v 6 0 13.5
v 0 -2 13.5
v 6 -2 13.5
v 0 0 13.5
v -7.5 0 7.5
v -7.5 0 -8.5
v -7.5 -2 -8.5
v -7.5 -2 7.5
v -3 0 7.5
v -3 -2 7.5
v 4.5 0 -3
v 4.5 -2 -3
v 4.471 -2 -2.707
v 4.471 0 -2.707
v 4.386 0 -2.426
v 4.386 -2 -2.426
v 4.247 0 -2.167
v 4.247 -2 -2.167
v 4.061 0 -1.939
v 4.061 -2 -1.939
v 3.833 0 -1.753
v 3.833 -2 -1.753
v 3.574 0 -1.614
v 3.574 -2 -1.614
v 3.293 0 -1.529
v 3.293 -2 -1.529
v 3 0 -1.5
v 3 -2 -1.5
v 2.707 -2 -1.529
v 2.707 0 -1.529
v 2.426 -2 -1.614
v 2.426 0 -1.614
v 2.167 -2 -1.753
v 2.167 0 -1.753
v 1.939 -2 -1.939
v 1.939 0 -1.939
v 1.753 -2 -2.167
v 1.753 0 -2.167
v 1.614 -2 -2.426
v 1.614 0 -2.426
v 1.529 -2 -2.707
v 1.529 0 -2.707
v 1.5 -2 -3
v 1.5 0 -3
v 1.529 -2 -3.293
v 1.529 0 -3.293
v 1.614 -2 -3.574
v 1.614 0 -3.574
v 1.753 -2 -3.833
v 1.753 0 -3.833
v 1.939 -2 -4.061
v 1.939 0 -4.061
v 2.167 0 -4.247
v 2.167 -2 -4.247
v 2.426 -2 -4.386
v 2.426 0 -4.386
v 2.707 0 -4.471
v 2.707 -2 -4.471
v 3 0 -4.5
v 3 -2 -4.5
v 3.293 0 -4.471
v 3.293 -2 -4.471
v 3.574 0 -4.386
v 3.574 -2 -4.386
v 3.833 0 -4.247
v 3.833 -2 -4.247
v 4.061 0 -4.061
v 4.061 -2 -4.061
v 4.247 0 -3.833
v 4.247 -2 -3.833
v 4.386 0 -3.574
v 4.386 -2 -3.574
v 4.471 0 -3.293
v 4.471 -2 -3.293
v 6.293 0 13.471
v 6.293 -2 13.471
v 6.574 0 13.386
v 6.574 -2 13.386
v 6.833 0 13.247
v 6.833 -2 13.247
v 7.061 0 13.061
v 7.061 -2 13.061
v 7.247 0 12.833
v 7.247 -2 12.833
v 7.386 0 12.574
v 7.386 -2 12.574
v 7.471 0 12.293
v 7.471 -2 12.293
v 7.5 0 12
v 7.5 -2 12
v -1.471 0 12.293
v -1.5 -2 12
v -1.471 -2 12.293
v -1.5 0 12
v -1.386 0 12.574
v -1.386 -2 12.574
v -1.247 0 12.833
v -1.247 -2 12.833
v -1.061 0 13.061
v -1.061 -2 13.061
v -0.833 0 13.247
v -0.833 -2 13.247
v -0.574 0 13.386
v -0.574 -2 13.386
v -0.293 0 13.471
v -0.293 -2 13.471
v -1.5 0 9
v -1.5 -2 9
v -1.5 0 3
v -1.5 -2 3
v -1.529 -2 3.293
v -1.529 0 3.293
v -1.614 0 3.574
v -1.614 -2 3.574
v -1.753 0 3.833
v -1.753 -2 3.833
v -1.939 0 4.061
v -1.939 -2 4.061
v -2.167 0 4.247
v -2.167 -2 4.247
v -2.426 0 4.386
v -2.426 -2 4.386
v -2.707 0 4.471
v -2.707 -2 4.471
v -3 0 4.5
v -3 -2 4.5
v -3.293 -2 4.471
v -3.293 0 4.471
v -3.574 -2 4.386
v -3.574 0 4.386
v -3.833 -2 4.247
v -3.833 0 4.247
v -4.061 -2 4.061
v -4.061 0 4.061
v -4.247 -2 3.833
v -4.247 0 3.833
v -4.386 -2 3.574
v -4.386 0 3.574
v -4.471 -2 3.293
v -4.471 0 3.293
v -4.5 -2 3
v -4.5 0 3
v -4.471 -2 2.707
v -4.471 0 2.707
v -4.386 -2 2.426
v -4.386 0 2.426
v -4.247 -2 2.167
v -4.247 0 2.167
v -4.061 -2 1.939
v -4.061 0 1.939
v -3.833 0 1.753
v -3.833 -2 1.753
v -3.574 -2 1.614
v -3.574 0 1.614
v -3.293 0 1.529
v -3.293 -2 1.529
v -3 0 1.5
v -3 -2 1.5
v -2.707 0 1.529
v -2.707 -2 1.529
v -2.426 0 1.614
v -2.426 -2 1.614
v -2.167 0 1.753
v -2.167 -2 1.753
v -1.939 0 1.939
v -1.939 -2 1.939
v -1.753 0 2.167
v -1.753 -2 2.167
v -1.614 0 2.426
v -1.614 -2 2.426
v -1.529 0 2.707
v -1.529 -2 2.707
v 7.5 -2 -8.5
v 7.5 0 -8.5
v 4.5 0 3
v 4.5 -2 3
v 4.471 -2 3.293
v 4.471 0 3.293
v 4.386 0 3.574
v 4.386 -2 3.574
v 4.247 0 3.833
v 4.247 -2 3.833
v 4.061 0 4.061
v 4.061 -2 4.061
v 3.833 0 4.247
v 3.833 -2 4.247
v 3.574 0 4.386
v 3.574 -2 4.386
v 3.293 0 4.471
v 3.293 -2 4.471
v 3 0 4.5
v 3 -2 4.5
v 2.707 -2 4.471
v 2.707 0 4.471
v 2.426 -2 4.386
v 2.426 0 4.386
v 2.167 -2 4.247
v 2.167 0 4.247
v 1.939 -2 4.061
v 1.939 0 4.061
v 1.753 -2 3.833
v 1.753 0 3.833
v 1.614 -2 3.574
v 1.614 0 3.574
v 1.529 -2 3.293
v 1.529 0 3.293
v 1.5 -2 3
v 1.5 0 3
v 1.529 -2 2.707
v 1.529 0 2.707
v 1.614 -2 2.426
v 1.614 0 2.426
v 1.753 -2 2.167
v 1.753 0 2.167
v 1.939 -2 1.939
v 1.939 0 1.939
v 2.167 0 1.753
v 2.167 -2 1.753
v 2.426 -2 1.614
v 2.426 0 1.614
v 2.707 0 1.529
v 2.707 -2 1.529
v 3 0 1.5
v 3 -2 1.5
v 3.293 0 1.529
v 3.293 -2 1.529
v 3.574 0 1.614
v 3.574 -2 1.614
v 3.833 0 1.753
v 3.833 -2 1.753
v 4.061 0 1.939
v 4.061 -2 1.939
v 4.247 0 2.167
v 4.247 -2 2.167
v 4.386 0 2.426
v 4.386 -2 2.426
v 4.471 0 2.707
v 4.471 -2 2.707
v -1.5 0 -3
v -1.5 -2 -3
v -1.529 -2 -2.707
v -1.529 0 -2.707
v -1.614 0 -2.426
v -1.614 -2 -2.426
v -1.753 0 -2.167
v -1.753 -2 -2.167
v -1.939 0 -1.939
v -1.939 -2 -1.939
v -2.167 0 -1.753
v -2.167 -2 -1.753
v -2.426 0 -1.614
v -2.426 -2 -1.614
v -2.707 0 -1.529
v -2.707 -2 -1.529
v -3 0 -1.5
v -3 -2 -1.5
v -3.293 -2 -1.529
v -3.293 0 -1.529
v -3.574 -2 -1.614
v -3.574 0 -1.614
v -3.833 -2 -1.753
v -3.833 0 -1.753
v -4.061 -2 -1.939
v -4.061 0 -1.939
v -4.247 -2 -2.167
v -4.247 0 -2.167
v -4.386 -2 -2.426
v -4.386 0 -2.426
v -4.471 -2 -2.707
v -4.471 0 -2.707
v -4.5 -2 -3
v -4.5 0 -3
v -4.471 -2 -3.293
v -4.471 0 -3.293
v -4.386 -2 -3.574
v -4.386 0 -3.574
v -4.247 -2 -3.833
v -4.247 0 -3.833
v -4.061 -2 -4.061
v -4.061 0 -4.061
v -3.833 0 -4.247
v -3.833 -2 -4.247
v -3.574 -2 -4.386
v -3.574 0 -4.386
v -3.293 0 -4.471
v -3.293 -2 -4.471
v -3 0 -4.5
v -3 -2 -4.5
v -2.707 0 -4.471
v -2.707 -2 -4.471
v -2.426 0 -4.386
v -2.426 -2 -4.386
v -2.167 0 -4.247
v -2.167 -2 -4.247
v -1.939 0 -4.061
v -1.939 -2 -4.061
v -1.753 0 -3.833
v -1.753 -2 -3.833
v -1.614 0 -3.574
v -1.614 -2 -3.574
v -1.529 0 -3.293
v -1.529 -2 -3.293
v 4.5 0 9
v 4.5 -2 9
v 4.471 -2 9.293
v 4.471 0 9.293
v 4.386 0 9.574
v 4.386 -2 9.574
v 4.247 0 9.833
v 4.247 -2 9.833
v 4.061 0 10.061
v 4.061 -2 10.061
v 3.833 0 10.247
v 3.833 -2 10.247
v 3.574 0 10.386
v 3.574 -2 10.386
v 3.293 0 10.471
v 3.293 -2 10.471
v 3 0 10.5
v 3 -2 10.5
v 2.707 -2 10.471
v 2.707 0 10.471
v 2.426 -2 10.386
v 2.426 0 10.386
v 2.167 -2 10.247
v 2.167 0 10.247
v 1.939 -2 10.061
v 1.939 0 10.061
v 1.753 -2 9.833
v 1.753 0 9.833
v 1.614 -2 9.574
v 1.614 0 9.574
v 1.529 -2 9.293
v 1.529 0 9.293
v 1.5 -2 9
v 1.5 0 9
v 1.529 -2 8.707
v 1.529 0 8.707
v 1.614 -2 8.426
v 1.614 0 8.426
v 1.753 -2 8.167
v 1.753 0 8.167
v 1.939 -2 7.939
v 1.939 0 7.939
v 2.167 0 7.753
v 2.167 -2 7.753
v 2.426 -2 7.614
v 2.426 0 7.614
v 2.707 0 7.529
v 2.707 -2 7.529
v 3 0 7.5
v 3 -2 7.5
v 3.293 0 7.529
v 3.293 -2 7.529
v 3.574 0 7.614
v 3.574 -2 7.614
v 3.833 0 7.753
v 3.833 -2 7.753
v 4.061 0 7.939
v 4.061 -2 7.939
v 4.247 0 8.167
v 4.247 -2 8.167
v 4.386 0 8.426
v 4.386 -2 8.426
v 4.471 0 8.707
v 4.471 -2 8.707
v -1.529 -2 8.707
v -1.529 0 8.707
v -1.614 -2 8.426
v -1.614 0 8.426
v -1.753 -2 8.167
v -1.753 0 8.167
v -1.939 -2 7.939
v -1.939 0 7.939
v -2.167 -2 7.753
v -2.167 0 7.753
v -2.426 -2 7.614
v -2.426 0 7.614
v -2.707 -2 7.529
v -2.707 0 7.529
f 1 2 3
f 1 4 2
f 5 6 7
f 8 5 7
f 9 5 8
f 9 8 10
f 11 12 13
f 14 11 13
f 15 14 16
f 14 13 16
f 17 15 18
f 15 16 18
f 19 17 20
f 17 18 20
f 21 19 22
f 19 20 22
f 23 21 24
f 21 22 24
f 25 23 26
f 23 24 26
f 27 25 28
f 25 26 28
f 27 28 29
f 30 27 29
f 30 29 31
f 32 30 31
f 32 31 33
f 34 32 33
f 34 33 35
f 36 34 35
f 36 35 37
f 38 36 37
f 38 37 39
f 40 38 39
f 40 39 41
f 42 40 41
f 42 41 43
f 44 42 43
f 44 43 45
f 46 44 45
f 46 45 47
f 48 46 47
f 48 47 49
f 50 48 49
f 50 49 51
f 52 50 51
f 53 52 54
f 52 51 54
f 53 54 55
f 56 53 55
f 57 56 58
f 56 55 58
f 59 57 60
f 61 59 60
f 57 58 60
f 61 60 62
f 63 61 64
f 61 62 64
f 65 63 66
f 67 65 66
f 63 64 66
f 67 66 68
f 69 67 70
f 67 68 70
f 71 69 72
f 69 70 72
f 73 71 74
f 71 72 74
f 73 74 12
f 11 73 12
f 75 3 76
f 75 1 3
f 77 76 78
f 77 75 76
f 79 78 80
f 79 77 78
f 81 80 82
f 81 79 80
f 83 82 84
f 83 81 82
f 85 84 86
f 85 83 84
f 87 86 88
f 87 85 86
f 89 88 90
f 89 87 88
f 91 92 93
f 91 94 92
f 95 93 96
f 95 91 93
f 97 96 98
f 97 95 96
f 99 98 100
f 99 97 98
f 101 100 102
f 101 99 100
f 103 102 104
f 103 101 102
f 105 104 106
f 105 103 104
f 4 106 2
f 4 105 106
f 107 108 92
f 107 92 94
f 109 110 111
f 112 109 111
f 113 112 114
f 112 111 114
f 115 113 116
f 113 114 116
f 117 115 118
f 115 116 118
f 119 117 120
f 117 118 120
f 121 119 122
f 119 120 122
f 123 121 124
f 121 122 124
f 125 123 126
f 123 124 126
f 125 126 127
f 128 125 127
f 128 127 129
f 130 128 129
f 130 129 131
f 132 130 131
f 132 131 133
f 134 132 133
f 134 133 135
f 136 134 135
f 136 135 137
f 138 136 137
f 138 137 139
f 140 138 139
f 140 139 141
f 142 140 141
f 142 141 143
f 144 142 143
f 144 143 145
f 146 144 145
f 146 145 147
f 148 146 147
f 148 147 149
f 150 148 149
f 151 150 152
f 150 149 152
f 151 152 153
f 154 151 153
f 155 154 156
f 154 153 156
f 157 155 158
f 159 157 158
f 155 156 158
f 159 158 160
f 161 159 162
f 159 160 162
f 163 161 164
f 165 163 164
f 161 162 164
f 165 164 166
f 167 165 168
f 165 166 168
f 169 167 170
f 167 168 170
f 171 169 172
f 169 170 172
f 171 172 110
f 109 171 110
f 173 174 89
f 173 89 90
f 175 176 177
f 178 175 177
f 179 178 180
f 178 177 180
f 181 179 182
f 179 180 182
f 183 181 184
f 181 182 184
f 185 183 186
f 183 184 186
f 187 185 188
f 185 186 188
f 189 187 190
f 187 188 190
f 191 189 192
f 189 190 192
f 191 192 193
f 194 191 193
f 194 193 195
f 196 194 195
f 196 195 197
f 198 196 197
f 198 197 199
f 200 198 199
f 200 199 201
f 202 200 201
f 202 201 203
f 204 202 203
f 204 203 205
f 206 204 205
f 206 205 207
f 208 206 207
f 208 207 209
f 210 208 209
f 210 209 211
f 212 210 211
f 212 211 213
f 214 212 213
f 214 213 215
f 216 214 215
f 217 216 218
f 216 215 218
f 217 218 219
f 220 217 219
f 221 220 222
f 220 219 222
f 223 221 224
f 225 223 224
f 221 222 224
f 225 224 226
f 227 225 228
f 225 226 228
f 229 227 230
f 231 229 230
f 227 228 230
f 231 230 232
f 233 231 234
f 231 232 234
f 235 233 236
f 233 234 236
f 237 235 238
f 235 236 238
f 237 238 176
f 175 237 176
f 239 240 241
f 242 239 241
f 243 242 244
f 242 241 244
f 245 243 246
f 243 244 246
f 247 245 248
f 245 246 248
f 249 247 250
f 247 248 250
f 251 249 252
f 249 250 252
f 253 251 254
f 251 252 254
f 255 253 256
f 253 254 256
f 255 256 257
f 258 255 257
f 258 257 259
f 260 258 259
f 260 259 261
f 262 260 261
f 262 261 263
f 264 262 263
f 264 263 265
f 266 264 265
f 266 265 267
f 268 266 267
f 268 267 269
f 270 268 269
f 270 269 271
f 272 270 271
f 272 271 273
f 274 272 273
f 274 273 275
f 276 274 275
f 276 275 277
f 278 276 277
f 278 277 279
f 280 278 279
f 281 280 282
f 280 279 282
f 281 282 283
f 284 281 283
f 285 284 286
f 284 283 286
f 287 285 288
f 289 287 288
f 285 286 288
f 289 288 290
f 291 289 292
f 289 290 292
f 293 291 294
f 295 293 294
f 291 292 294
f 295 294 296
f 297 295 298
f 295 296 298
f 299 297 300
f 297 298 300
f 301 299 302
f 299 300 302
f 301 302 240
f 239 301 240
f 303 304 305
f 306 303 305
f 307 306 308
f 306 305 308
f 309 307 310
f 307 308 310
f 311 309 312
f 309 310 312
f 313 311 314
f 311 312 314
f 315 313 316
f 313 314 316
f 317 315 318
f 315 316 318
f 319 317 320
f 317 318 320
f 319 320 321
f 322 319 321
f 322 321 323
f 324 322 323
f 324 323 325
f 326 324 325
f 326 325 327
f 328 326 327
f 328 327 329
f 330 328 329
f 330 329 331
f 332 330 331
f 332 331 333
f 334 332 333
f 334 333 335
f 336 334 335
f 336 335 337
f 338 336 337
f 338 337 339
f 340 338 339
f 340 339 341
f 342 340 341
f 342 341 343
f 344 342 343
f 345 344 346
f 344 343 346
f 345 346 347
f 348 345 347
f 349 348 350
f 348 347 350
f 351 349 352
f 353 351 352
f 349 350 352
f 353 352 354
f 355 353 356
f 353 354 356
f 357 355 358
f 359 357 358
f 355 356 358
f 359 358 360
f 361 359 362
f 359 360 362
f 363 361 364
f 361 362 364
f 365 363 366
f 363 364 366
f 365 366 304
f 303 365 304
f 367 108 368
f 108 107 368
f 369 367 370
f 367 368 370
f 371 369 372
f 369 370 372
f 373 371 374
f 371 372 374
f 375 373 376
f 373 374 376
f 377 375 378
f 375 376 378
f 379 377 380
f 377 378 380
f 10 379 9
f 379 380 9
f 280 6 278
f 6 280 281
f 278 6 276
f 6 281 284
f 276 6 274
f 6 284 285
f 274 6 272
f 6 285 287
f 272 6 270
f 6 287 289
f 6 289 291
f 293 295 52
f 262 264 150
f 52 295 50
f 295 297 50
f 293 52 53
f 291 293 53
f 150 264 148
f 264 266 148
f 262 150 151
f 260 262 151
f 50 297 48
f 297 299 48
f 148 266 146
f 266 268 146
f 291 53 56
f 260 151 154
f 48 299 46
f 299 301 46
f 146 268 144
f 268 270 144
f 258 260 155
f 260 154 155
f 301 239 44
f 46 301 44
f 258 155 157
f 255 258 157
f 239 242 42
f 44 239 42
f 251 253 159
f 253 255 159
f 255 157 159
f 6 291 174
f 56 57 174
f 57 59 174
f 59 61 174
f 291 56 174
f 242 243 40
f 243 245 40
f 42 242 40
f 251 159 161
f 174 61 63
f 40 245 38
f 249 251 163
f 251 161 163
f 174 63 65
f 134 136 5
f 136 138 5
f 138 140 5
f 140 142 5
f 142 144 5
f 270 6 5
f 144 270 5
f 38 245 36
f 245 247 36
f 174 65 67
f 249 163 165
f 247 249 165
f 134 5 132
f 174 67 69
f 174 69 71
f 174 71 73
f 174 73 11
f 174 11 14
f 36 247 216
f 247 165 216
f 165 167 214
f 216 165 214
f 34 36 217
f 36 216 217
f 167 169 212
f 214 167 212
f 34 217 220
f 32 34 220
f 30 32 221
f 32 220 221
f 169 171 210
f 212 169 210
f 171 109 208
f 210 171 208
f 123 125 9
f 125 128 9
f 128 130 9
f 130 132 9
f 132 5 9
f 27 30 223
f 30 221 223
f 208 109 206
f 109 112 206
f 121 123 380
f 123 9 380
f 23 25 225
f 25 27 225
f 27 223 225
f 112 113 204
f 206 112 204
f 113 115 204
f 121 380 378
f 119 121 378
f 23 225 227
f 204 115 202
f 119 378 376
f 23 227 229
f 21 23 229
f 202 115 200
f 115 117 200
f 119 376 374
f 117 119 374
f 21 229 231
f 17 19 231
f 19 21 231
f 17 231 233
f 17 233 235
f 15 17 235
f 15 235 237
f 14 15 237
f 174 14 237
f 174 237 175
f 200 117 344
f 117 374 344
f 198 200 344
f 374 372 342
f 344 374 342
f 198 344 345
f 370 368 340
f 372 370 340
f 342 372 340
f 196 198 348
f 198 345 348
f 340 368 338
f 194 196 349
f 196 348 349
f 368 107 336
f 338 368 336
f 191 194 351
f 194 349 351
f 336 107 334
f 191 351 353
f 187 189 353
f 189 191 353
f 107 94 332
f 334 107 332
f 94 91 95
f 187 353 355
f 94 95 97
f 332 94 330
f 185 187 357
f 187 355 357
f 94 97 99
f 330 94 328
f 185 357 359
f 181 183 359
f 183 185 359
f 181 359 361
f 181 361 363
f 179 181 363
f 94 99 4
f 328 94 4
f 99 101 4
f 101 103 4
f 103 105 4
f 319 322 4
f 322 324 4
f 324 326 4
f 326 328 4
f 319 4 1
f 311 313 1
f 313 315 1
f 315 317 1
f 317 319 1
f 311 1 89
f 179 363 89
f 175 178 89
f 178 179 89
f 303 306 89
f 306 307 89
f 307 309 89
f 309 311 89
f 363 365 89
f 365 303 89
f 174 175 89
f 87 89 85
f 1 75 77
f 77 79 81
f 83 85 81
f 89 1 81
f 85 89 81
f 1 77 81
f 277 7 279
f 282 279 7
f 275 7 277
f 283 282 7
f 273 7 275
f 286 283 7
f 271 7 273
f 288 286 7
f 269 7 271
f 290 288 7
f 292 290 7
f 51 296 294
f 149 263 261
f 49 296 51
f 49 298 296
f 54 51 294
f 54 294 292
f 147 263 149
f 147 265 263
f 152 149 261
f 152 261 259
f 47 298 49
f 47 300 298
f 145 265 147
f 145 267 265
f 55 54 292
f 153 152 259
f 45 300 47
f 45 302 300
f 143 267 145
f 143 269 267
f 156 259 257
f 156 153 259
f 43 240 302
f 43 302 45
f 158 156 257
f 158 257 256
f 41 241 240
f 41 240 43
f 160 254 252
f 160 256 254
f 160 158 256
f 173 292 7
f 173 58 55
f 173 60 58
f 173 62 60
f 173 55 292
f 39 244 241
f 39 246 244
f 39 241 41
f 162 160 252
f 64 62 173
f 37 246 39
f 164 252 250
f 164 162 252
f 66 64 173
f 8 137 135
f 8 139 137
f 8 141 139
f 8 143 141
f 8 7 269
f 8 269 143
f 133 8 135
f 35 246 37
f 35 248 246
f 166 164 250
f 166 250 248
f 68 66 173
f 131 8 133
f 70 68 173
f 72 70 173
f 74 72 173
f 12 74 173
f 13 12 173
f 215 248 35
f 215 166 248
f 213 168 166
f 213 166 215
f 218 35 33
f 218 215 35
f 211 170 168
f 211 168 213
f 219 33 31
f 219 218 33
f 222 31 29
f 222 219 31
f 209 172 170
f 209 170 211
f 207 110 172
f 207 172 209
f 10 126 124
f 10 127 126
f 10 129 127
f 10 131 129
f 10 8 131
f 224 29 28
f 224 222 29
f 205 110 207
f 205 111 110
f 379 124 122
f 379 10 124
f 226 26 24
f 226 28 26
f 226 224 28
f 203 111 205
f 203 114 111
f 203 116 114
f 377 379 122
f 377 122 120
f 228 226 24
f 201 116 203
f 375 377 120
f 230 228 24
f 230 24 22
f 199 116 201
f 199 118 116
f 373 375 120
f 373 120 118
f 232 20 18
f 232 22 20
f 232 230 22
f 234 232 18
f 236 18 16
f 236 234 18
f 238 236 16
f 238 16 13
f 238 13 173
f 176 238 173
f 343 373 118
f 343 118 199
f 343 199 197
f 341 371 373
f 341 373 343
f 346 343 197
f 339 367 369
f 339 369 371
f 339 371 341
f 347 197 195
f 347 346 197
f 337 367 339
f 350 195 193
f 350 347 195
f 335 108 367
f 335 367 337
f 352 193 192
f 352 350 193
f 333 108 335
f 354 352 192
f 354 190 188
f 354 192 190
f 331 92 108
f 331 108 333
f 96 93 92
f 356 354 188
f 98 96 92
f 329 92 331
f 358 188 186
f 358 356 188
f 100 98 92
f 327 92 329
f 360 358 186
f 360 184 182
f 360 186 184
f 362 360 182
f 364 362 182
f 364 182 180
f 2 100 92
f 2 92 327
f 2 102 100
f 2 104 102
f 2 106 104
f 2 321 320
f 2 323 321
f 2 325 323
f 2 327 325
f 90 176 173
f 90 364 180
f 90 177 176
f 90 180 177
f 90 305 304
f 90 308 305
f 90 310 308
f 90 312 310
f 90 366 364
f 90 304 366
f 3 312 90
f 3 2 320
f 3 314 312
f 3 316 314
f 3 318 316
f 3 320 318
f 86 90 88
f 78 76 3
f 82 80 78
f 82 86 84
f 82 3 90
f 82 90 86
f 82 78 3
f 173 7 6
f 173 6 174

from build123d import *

# Parameters (mm, degrees)
F0_W      = 15
F0_H      = 15
F1_DEPTH  = 2
F2_R      = 1.5
F3_DEPTH  = 25
F4_W      = 9
F4_H      = 2
F5_DEPTH  = 6
F6_R      = 1.5
F7_DEPTH  = 25
F8_R      = 1.5
F9_W      = 15
F9_H      = 2
F10_DEPTH = 1


with BuildPart() as f1:
    # F0 (on Front) → F1 (new body)
    with BuildSketch(Plane.XZ):
        Rectangle(F0_W, F0_H)
    extrude(amount=F1_DEPTH)

    # F2 (on face) → F3 (cut)
    with BuildSketch(Plane.XZ.offset(2)):
        with Locations((3, 3)):
            Circle(F2_R)
        with Locations((-3, 3)):
            Circle(F2_R)
        with Locations((-3, -3)):
            Circle(F2_R)
        with Locations((3, -3)):
            Circle(F2_R)
    extrude(amount=-F3_DEPTH, mode=Mode.SUBTRACT)

    # F4 (on face) → F5 (join)
    with BuildSketch(Plane.XY.offset(7.5)):
        with Locations((3, -1)):
            Rectangle(F4_W, F4_H)
    extrude(amount=F5_DEPTH)

    # F6 (on face) → F7 (cut)
    with BuildSketch(Plane.XZ.offset(2)):
        with Locations((3, 9)):
            Circle(F6_R)
    extrude(amount=-F7_DEPTH, mode=Mode.SUBTRACT)

    # F8
    f8_edges = [f1.edges().sort_by_distance(p)[0] for p in [
        (7.5, -1, 13.5),
        (-1.5, -1, 13.5),
        (-1.5, -1, 7.5),
    ]]
    fillet(f8_edges, radius=F8_R)

    # F9 (on face) → F10 (join)
    with BuildSketch(Plane(origin=(0, 0, -7.5), x_dir=(1, 0, 0), z_dir=(0, 0, -1))):
        with Locations((0, 1)):
            Rectangle(F9_W, F9_H)
    extrude(amount=F10_DEPTH)


solid = f1.part
